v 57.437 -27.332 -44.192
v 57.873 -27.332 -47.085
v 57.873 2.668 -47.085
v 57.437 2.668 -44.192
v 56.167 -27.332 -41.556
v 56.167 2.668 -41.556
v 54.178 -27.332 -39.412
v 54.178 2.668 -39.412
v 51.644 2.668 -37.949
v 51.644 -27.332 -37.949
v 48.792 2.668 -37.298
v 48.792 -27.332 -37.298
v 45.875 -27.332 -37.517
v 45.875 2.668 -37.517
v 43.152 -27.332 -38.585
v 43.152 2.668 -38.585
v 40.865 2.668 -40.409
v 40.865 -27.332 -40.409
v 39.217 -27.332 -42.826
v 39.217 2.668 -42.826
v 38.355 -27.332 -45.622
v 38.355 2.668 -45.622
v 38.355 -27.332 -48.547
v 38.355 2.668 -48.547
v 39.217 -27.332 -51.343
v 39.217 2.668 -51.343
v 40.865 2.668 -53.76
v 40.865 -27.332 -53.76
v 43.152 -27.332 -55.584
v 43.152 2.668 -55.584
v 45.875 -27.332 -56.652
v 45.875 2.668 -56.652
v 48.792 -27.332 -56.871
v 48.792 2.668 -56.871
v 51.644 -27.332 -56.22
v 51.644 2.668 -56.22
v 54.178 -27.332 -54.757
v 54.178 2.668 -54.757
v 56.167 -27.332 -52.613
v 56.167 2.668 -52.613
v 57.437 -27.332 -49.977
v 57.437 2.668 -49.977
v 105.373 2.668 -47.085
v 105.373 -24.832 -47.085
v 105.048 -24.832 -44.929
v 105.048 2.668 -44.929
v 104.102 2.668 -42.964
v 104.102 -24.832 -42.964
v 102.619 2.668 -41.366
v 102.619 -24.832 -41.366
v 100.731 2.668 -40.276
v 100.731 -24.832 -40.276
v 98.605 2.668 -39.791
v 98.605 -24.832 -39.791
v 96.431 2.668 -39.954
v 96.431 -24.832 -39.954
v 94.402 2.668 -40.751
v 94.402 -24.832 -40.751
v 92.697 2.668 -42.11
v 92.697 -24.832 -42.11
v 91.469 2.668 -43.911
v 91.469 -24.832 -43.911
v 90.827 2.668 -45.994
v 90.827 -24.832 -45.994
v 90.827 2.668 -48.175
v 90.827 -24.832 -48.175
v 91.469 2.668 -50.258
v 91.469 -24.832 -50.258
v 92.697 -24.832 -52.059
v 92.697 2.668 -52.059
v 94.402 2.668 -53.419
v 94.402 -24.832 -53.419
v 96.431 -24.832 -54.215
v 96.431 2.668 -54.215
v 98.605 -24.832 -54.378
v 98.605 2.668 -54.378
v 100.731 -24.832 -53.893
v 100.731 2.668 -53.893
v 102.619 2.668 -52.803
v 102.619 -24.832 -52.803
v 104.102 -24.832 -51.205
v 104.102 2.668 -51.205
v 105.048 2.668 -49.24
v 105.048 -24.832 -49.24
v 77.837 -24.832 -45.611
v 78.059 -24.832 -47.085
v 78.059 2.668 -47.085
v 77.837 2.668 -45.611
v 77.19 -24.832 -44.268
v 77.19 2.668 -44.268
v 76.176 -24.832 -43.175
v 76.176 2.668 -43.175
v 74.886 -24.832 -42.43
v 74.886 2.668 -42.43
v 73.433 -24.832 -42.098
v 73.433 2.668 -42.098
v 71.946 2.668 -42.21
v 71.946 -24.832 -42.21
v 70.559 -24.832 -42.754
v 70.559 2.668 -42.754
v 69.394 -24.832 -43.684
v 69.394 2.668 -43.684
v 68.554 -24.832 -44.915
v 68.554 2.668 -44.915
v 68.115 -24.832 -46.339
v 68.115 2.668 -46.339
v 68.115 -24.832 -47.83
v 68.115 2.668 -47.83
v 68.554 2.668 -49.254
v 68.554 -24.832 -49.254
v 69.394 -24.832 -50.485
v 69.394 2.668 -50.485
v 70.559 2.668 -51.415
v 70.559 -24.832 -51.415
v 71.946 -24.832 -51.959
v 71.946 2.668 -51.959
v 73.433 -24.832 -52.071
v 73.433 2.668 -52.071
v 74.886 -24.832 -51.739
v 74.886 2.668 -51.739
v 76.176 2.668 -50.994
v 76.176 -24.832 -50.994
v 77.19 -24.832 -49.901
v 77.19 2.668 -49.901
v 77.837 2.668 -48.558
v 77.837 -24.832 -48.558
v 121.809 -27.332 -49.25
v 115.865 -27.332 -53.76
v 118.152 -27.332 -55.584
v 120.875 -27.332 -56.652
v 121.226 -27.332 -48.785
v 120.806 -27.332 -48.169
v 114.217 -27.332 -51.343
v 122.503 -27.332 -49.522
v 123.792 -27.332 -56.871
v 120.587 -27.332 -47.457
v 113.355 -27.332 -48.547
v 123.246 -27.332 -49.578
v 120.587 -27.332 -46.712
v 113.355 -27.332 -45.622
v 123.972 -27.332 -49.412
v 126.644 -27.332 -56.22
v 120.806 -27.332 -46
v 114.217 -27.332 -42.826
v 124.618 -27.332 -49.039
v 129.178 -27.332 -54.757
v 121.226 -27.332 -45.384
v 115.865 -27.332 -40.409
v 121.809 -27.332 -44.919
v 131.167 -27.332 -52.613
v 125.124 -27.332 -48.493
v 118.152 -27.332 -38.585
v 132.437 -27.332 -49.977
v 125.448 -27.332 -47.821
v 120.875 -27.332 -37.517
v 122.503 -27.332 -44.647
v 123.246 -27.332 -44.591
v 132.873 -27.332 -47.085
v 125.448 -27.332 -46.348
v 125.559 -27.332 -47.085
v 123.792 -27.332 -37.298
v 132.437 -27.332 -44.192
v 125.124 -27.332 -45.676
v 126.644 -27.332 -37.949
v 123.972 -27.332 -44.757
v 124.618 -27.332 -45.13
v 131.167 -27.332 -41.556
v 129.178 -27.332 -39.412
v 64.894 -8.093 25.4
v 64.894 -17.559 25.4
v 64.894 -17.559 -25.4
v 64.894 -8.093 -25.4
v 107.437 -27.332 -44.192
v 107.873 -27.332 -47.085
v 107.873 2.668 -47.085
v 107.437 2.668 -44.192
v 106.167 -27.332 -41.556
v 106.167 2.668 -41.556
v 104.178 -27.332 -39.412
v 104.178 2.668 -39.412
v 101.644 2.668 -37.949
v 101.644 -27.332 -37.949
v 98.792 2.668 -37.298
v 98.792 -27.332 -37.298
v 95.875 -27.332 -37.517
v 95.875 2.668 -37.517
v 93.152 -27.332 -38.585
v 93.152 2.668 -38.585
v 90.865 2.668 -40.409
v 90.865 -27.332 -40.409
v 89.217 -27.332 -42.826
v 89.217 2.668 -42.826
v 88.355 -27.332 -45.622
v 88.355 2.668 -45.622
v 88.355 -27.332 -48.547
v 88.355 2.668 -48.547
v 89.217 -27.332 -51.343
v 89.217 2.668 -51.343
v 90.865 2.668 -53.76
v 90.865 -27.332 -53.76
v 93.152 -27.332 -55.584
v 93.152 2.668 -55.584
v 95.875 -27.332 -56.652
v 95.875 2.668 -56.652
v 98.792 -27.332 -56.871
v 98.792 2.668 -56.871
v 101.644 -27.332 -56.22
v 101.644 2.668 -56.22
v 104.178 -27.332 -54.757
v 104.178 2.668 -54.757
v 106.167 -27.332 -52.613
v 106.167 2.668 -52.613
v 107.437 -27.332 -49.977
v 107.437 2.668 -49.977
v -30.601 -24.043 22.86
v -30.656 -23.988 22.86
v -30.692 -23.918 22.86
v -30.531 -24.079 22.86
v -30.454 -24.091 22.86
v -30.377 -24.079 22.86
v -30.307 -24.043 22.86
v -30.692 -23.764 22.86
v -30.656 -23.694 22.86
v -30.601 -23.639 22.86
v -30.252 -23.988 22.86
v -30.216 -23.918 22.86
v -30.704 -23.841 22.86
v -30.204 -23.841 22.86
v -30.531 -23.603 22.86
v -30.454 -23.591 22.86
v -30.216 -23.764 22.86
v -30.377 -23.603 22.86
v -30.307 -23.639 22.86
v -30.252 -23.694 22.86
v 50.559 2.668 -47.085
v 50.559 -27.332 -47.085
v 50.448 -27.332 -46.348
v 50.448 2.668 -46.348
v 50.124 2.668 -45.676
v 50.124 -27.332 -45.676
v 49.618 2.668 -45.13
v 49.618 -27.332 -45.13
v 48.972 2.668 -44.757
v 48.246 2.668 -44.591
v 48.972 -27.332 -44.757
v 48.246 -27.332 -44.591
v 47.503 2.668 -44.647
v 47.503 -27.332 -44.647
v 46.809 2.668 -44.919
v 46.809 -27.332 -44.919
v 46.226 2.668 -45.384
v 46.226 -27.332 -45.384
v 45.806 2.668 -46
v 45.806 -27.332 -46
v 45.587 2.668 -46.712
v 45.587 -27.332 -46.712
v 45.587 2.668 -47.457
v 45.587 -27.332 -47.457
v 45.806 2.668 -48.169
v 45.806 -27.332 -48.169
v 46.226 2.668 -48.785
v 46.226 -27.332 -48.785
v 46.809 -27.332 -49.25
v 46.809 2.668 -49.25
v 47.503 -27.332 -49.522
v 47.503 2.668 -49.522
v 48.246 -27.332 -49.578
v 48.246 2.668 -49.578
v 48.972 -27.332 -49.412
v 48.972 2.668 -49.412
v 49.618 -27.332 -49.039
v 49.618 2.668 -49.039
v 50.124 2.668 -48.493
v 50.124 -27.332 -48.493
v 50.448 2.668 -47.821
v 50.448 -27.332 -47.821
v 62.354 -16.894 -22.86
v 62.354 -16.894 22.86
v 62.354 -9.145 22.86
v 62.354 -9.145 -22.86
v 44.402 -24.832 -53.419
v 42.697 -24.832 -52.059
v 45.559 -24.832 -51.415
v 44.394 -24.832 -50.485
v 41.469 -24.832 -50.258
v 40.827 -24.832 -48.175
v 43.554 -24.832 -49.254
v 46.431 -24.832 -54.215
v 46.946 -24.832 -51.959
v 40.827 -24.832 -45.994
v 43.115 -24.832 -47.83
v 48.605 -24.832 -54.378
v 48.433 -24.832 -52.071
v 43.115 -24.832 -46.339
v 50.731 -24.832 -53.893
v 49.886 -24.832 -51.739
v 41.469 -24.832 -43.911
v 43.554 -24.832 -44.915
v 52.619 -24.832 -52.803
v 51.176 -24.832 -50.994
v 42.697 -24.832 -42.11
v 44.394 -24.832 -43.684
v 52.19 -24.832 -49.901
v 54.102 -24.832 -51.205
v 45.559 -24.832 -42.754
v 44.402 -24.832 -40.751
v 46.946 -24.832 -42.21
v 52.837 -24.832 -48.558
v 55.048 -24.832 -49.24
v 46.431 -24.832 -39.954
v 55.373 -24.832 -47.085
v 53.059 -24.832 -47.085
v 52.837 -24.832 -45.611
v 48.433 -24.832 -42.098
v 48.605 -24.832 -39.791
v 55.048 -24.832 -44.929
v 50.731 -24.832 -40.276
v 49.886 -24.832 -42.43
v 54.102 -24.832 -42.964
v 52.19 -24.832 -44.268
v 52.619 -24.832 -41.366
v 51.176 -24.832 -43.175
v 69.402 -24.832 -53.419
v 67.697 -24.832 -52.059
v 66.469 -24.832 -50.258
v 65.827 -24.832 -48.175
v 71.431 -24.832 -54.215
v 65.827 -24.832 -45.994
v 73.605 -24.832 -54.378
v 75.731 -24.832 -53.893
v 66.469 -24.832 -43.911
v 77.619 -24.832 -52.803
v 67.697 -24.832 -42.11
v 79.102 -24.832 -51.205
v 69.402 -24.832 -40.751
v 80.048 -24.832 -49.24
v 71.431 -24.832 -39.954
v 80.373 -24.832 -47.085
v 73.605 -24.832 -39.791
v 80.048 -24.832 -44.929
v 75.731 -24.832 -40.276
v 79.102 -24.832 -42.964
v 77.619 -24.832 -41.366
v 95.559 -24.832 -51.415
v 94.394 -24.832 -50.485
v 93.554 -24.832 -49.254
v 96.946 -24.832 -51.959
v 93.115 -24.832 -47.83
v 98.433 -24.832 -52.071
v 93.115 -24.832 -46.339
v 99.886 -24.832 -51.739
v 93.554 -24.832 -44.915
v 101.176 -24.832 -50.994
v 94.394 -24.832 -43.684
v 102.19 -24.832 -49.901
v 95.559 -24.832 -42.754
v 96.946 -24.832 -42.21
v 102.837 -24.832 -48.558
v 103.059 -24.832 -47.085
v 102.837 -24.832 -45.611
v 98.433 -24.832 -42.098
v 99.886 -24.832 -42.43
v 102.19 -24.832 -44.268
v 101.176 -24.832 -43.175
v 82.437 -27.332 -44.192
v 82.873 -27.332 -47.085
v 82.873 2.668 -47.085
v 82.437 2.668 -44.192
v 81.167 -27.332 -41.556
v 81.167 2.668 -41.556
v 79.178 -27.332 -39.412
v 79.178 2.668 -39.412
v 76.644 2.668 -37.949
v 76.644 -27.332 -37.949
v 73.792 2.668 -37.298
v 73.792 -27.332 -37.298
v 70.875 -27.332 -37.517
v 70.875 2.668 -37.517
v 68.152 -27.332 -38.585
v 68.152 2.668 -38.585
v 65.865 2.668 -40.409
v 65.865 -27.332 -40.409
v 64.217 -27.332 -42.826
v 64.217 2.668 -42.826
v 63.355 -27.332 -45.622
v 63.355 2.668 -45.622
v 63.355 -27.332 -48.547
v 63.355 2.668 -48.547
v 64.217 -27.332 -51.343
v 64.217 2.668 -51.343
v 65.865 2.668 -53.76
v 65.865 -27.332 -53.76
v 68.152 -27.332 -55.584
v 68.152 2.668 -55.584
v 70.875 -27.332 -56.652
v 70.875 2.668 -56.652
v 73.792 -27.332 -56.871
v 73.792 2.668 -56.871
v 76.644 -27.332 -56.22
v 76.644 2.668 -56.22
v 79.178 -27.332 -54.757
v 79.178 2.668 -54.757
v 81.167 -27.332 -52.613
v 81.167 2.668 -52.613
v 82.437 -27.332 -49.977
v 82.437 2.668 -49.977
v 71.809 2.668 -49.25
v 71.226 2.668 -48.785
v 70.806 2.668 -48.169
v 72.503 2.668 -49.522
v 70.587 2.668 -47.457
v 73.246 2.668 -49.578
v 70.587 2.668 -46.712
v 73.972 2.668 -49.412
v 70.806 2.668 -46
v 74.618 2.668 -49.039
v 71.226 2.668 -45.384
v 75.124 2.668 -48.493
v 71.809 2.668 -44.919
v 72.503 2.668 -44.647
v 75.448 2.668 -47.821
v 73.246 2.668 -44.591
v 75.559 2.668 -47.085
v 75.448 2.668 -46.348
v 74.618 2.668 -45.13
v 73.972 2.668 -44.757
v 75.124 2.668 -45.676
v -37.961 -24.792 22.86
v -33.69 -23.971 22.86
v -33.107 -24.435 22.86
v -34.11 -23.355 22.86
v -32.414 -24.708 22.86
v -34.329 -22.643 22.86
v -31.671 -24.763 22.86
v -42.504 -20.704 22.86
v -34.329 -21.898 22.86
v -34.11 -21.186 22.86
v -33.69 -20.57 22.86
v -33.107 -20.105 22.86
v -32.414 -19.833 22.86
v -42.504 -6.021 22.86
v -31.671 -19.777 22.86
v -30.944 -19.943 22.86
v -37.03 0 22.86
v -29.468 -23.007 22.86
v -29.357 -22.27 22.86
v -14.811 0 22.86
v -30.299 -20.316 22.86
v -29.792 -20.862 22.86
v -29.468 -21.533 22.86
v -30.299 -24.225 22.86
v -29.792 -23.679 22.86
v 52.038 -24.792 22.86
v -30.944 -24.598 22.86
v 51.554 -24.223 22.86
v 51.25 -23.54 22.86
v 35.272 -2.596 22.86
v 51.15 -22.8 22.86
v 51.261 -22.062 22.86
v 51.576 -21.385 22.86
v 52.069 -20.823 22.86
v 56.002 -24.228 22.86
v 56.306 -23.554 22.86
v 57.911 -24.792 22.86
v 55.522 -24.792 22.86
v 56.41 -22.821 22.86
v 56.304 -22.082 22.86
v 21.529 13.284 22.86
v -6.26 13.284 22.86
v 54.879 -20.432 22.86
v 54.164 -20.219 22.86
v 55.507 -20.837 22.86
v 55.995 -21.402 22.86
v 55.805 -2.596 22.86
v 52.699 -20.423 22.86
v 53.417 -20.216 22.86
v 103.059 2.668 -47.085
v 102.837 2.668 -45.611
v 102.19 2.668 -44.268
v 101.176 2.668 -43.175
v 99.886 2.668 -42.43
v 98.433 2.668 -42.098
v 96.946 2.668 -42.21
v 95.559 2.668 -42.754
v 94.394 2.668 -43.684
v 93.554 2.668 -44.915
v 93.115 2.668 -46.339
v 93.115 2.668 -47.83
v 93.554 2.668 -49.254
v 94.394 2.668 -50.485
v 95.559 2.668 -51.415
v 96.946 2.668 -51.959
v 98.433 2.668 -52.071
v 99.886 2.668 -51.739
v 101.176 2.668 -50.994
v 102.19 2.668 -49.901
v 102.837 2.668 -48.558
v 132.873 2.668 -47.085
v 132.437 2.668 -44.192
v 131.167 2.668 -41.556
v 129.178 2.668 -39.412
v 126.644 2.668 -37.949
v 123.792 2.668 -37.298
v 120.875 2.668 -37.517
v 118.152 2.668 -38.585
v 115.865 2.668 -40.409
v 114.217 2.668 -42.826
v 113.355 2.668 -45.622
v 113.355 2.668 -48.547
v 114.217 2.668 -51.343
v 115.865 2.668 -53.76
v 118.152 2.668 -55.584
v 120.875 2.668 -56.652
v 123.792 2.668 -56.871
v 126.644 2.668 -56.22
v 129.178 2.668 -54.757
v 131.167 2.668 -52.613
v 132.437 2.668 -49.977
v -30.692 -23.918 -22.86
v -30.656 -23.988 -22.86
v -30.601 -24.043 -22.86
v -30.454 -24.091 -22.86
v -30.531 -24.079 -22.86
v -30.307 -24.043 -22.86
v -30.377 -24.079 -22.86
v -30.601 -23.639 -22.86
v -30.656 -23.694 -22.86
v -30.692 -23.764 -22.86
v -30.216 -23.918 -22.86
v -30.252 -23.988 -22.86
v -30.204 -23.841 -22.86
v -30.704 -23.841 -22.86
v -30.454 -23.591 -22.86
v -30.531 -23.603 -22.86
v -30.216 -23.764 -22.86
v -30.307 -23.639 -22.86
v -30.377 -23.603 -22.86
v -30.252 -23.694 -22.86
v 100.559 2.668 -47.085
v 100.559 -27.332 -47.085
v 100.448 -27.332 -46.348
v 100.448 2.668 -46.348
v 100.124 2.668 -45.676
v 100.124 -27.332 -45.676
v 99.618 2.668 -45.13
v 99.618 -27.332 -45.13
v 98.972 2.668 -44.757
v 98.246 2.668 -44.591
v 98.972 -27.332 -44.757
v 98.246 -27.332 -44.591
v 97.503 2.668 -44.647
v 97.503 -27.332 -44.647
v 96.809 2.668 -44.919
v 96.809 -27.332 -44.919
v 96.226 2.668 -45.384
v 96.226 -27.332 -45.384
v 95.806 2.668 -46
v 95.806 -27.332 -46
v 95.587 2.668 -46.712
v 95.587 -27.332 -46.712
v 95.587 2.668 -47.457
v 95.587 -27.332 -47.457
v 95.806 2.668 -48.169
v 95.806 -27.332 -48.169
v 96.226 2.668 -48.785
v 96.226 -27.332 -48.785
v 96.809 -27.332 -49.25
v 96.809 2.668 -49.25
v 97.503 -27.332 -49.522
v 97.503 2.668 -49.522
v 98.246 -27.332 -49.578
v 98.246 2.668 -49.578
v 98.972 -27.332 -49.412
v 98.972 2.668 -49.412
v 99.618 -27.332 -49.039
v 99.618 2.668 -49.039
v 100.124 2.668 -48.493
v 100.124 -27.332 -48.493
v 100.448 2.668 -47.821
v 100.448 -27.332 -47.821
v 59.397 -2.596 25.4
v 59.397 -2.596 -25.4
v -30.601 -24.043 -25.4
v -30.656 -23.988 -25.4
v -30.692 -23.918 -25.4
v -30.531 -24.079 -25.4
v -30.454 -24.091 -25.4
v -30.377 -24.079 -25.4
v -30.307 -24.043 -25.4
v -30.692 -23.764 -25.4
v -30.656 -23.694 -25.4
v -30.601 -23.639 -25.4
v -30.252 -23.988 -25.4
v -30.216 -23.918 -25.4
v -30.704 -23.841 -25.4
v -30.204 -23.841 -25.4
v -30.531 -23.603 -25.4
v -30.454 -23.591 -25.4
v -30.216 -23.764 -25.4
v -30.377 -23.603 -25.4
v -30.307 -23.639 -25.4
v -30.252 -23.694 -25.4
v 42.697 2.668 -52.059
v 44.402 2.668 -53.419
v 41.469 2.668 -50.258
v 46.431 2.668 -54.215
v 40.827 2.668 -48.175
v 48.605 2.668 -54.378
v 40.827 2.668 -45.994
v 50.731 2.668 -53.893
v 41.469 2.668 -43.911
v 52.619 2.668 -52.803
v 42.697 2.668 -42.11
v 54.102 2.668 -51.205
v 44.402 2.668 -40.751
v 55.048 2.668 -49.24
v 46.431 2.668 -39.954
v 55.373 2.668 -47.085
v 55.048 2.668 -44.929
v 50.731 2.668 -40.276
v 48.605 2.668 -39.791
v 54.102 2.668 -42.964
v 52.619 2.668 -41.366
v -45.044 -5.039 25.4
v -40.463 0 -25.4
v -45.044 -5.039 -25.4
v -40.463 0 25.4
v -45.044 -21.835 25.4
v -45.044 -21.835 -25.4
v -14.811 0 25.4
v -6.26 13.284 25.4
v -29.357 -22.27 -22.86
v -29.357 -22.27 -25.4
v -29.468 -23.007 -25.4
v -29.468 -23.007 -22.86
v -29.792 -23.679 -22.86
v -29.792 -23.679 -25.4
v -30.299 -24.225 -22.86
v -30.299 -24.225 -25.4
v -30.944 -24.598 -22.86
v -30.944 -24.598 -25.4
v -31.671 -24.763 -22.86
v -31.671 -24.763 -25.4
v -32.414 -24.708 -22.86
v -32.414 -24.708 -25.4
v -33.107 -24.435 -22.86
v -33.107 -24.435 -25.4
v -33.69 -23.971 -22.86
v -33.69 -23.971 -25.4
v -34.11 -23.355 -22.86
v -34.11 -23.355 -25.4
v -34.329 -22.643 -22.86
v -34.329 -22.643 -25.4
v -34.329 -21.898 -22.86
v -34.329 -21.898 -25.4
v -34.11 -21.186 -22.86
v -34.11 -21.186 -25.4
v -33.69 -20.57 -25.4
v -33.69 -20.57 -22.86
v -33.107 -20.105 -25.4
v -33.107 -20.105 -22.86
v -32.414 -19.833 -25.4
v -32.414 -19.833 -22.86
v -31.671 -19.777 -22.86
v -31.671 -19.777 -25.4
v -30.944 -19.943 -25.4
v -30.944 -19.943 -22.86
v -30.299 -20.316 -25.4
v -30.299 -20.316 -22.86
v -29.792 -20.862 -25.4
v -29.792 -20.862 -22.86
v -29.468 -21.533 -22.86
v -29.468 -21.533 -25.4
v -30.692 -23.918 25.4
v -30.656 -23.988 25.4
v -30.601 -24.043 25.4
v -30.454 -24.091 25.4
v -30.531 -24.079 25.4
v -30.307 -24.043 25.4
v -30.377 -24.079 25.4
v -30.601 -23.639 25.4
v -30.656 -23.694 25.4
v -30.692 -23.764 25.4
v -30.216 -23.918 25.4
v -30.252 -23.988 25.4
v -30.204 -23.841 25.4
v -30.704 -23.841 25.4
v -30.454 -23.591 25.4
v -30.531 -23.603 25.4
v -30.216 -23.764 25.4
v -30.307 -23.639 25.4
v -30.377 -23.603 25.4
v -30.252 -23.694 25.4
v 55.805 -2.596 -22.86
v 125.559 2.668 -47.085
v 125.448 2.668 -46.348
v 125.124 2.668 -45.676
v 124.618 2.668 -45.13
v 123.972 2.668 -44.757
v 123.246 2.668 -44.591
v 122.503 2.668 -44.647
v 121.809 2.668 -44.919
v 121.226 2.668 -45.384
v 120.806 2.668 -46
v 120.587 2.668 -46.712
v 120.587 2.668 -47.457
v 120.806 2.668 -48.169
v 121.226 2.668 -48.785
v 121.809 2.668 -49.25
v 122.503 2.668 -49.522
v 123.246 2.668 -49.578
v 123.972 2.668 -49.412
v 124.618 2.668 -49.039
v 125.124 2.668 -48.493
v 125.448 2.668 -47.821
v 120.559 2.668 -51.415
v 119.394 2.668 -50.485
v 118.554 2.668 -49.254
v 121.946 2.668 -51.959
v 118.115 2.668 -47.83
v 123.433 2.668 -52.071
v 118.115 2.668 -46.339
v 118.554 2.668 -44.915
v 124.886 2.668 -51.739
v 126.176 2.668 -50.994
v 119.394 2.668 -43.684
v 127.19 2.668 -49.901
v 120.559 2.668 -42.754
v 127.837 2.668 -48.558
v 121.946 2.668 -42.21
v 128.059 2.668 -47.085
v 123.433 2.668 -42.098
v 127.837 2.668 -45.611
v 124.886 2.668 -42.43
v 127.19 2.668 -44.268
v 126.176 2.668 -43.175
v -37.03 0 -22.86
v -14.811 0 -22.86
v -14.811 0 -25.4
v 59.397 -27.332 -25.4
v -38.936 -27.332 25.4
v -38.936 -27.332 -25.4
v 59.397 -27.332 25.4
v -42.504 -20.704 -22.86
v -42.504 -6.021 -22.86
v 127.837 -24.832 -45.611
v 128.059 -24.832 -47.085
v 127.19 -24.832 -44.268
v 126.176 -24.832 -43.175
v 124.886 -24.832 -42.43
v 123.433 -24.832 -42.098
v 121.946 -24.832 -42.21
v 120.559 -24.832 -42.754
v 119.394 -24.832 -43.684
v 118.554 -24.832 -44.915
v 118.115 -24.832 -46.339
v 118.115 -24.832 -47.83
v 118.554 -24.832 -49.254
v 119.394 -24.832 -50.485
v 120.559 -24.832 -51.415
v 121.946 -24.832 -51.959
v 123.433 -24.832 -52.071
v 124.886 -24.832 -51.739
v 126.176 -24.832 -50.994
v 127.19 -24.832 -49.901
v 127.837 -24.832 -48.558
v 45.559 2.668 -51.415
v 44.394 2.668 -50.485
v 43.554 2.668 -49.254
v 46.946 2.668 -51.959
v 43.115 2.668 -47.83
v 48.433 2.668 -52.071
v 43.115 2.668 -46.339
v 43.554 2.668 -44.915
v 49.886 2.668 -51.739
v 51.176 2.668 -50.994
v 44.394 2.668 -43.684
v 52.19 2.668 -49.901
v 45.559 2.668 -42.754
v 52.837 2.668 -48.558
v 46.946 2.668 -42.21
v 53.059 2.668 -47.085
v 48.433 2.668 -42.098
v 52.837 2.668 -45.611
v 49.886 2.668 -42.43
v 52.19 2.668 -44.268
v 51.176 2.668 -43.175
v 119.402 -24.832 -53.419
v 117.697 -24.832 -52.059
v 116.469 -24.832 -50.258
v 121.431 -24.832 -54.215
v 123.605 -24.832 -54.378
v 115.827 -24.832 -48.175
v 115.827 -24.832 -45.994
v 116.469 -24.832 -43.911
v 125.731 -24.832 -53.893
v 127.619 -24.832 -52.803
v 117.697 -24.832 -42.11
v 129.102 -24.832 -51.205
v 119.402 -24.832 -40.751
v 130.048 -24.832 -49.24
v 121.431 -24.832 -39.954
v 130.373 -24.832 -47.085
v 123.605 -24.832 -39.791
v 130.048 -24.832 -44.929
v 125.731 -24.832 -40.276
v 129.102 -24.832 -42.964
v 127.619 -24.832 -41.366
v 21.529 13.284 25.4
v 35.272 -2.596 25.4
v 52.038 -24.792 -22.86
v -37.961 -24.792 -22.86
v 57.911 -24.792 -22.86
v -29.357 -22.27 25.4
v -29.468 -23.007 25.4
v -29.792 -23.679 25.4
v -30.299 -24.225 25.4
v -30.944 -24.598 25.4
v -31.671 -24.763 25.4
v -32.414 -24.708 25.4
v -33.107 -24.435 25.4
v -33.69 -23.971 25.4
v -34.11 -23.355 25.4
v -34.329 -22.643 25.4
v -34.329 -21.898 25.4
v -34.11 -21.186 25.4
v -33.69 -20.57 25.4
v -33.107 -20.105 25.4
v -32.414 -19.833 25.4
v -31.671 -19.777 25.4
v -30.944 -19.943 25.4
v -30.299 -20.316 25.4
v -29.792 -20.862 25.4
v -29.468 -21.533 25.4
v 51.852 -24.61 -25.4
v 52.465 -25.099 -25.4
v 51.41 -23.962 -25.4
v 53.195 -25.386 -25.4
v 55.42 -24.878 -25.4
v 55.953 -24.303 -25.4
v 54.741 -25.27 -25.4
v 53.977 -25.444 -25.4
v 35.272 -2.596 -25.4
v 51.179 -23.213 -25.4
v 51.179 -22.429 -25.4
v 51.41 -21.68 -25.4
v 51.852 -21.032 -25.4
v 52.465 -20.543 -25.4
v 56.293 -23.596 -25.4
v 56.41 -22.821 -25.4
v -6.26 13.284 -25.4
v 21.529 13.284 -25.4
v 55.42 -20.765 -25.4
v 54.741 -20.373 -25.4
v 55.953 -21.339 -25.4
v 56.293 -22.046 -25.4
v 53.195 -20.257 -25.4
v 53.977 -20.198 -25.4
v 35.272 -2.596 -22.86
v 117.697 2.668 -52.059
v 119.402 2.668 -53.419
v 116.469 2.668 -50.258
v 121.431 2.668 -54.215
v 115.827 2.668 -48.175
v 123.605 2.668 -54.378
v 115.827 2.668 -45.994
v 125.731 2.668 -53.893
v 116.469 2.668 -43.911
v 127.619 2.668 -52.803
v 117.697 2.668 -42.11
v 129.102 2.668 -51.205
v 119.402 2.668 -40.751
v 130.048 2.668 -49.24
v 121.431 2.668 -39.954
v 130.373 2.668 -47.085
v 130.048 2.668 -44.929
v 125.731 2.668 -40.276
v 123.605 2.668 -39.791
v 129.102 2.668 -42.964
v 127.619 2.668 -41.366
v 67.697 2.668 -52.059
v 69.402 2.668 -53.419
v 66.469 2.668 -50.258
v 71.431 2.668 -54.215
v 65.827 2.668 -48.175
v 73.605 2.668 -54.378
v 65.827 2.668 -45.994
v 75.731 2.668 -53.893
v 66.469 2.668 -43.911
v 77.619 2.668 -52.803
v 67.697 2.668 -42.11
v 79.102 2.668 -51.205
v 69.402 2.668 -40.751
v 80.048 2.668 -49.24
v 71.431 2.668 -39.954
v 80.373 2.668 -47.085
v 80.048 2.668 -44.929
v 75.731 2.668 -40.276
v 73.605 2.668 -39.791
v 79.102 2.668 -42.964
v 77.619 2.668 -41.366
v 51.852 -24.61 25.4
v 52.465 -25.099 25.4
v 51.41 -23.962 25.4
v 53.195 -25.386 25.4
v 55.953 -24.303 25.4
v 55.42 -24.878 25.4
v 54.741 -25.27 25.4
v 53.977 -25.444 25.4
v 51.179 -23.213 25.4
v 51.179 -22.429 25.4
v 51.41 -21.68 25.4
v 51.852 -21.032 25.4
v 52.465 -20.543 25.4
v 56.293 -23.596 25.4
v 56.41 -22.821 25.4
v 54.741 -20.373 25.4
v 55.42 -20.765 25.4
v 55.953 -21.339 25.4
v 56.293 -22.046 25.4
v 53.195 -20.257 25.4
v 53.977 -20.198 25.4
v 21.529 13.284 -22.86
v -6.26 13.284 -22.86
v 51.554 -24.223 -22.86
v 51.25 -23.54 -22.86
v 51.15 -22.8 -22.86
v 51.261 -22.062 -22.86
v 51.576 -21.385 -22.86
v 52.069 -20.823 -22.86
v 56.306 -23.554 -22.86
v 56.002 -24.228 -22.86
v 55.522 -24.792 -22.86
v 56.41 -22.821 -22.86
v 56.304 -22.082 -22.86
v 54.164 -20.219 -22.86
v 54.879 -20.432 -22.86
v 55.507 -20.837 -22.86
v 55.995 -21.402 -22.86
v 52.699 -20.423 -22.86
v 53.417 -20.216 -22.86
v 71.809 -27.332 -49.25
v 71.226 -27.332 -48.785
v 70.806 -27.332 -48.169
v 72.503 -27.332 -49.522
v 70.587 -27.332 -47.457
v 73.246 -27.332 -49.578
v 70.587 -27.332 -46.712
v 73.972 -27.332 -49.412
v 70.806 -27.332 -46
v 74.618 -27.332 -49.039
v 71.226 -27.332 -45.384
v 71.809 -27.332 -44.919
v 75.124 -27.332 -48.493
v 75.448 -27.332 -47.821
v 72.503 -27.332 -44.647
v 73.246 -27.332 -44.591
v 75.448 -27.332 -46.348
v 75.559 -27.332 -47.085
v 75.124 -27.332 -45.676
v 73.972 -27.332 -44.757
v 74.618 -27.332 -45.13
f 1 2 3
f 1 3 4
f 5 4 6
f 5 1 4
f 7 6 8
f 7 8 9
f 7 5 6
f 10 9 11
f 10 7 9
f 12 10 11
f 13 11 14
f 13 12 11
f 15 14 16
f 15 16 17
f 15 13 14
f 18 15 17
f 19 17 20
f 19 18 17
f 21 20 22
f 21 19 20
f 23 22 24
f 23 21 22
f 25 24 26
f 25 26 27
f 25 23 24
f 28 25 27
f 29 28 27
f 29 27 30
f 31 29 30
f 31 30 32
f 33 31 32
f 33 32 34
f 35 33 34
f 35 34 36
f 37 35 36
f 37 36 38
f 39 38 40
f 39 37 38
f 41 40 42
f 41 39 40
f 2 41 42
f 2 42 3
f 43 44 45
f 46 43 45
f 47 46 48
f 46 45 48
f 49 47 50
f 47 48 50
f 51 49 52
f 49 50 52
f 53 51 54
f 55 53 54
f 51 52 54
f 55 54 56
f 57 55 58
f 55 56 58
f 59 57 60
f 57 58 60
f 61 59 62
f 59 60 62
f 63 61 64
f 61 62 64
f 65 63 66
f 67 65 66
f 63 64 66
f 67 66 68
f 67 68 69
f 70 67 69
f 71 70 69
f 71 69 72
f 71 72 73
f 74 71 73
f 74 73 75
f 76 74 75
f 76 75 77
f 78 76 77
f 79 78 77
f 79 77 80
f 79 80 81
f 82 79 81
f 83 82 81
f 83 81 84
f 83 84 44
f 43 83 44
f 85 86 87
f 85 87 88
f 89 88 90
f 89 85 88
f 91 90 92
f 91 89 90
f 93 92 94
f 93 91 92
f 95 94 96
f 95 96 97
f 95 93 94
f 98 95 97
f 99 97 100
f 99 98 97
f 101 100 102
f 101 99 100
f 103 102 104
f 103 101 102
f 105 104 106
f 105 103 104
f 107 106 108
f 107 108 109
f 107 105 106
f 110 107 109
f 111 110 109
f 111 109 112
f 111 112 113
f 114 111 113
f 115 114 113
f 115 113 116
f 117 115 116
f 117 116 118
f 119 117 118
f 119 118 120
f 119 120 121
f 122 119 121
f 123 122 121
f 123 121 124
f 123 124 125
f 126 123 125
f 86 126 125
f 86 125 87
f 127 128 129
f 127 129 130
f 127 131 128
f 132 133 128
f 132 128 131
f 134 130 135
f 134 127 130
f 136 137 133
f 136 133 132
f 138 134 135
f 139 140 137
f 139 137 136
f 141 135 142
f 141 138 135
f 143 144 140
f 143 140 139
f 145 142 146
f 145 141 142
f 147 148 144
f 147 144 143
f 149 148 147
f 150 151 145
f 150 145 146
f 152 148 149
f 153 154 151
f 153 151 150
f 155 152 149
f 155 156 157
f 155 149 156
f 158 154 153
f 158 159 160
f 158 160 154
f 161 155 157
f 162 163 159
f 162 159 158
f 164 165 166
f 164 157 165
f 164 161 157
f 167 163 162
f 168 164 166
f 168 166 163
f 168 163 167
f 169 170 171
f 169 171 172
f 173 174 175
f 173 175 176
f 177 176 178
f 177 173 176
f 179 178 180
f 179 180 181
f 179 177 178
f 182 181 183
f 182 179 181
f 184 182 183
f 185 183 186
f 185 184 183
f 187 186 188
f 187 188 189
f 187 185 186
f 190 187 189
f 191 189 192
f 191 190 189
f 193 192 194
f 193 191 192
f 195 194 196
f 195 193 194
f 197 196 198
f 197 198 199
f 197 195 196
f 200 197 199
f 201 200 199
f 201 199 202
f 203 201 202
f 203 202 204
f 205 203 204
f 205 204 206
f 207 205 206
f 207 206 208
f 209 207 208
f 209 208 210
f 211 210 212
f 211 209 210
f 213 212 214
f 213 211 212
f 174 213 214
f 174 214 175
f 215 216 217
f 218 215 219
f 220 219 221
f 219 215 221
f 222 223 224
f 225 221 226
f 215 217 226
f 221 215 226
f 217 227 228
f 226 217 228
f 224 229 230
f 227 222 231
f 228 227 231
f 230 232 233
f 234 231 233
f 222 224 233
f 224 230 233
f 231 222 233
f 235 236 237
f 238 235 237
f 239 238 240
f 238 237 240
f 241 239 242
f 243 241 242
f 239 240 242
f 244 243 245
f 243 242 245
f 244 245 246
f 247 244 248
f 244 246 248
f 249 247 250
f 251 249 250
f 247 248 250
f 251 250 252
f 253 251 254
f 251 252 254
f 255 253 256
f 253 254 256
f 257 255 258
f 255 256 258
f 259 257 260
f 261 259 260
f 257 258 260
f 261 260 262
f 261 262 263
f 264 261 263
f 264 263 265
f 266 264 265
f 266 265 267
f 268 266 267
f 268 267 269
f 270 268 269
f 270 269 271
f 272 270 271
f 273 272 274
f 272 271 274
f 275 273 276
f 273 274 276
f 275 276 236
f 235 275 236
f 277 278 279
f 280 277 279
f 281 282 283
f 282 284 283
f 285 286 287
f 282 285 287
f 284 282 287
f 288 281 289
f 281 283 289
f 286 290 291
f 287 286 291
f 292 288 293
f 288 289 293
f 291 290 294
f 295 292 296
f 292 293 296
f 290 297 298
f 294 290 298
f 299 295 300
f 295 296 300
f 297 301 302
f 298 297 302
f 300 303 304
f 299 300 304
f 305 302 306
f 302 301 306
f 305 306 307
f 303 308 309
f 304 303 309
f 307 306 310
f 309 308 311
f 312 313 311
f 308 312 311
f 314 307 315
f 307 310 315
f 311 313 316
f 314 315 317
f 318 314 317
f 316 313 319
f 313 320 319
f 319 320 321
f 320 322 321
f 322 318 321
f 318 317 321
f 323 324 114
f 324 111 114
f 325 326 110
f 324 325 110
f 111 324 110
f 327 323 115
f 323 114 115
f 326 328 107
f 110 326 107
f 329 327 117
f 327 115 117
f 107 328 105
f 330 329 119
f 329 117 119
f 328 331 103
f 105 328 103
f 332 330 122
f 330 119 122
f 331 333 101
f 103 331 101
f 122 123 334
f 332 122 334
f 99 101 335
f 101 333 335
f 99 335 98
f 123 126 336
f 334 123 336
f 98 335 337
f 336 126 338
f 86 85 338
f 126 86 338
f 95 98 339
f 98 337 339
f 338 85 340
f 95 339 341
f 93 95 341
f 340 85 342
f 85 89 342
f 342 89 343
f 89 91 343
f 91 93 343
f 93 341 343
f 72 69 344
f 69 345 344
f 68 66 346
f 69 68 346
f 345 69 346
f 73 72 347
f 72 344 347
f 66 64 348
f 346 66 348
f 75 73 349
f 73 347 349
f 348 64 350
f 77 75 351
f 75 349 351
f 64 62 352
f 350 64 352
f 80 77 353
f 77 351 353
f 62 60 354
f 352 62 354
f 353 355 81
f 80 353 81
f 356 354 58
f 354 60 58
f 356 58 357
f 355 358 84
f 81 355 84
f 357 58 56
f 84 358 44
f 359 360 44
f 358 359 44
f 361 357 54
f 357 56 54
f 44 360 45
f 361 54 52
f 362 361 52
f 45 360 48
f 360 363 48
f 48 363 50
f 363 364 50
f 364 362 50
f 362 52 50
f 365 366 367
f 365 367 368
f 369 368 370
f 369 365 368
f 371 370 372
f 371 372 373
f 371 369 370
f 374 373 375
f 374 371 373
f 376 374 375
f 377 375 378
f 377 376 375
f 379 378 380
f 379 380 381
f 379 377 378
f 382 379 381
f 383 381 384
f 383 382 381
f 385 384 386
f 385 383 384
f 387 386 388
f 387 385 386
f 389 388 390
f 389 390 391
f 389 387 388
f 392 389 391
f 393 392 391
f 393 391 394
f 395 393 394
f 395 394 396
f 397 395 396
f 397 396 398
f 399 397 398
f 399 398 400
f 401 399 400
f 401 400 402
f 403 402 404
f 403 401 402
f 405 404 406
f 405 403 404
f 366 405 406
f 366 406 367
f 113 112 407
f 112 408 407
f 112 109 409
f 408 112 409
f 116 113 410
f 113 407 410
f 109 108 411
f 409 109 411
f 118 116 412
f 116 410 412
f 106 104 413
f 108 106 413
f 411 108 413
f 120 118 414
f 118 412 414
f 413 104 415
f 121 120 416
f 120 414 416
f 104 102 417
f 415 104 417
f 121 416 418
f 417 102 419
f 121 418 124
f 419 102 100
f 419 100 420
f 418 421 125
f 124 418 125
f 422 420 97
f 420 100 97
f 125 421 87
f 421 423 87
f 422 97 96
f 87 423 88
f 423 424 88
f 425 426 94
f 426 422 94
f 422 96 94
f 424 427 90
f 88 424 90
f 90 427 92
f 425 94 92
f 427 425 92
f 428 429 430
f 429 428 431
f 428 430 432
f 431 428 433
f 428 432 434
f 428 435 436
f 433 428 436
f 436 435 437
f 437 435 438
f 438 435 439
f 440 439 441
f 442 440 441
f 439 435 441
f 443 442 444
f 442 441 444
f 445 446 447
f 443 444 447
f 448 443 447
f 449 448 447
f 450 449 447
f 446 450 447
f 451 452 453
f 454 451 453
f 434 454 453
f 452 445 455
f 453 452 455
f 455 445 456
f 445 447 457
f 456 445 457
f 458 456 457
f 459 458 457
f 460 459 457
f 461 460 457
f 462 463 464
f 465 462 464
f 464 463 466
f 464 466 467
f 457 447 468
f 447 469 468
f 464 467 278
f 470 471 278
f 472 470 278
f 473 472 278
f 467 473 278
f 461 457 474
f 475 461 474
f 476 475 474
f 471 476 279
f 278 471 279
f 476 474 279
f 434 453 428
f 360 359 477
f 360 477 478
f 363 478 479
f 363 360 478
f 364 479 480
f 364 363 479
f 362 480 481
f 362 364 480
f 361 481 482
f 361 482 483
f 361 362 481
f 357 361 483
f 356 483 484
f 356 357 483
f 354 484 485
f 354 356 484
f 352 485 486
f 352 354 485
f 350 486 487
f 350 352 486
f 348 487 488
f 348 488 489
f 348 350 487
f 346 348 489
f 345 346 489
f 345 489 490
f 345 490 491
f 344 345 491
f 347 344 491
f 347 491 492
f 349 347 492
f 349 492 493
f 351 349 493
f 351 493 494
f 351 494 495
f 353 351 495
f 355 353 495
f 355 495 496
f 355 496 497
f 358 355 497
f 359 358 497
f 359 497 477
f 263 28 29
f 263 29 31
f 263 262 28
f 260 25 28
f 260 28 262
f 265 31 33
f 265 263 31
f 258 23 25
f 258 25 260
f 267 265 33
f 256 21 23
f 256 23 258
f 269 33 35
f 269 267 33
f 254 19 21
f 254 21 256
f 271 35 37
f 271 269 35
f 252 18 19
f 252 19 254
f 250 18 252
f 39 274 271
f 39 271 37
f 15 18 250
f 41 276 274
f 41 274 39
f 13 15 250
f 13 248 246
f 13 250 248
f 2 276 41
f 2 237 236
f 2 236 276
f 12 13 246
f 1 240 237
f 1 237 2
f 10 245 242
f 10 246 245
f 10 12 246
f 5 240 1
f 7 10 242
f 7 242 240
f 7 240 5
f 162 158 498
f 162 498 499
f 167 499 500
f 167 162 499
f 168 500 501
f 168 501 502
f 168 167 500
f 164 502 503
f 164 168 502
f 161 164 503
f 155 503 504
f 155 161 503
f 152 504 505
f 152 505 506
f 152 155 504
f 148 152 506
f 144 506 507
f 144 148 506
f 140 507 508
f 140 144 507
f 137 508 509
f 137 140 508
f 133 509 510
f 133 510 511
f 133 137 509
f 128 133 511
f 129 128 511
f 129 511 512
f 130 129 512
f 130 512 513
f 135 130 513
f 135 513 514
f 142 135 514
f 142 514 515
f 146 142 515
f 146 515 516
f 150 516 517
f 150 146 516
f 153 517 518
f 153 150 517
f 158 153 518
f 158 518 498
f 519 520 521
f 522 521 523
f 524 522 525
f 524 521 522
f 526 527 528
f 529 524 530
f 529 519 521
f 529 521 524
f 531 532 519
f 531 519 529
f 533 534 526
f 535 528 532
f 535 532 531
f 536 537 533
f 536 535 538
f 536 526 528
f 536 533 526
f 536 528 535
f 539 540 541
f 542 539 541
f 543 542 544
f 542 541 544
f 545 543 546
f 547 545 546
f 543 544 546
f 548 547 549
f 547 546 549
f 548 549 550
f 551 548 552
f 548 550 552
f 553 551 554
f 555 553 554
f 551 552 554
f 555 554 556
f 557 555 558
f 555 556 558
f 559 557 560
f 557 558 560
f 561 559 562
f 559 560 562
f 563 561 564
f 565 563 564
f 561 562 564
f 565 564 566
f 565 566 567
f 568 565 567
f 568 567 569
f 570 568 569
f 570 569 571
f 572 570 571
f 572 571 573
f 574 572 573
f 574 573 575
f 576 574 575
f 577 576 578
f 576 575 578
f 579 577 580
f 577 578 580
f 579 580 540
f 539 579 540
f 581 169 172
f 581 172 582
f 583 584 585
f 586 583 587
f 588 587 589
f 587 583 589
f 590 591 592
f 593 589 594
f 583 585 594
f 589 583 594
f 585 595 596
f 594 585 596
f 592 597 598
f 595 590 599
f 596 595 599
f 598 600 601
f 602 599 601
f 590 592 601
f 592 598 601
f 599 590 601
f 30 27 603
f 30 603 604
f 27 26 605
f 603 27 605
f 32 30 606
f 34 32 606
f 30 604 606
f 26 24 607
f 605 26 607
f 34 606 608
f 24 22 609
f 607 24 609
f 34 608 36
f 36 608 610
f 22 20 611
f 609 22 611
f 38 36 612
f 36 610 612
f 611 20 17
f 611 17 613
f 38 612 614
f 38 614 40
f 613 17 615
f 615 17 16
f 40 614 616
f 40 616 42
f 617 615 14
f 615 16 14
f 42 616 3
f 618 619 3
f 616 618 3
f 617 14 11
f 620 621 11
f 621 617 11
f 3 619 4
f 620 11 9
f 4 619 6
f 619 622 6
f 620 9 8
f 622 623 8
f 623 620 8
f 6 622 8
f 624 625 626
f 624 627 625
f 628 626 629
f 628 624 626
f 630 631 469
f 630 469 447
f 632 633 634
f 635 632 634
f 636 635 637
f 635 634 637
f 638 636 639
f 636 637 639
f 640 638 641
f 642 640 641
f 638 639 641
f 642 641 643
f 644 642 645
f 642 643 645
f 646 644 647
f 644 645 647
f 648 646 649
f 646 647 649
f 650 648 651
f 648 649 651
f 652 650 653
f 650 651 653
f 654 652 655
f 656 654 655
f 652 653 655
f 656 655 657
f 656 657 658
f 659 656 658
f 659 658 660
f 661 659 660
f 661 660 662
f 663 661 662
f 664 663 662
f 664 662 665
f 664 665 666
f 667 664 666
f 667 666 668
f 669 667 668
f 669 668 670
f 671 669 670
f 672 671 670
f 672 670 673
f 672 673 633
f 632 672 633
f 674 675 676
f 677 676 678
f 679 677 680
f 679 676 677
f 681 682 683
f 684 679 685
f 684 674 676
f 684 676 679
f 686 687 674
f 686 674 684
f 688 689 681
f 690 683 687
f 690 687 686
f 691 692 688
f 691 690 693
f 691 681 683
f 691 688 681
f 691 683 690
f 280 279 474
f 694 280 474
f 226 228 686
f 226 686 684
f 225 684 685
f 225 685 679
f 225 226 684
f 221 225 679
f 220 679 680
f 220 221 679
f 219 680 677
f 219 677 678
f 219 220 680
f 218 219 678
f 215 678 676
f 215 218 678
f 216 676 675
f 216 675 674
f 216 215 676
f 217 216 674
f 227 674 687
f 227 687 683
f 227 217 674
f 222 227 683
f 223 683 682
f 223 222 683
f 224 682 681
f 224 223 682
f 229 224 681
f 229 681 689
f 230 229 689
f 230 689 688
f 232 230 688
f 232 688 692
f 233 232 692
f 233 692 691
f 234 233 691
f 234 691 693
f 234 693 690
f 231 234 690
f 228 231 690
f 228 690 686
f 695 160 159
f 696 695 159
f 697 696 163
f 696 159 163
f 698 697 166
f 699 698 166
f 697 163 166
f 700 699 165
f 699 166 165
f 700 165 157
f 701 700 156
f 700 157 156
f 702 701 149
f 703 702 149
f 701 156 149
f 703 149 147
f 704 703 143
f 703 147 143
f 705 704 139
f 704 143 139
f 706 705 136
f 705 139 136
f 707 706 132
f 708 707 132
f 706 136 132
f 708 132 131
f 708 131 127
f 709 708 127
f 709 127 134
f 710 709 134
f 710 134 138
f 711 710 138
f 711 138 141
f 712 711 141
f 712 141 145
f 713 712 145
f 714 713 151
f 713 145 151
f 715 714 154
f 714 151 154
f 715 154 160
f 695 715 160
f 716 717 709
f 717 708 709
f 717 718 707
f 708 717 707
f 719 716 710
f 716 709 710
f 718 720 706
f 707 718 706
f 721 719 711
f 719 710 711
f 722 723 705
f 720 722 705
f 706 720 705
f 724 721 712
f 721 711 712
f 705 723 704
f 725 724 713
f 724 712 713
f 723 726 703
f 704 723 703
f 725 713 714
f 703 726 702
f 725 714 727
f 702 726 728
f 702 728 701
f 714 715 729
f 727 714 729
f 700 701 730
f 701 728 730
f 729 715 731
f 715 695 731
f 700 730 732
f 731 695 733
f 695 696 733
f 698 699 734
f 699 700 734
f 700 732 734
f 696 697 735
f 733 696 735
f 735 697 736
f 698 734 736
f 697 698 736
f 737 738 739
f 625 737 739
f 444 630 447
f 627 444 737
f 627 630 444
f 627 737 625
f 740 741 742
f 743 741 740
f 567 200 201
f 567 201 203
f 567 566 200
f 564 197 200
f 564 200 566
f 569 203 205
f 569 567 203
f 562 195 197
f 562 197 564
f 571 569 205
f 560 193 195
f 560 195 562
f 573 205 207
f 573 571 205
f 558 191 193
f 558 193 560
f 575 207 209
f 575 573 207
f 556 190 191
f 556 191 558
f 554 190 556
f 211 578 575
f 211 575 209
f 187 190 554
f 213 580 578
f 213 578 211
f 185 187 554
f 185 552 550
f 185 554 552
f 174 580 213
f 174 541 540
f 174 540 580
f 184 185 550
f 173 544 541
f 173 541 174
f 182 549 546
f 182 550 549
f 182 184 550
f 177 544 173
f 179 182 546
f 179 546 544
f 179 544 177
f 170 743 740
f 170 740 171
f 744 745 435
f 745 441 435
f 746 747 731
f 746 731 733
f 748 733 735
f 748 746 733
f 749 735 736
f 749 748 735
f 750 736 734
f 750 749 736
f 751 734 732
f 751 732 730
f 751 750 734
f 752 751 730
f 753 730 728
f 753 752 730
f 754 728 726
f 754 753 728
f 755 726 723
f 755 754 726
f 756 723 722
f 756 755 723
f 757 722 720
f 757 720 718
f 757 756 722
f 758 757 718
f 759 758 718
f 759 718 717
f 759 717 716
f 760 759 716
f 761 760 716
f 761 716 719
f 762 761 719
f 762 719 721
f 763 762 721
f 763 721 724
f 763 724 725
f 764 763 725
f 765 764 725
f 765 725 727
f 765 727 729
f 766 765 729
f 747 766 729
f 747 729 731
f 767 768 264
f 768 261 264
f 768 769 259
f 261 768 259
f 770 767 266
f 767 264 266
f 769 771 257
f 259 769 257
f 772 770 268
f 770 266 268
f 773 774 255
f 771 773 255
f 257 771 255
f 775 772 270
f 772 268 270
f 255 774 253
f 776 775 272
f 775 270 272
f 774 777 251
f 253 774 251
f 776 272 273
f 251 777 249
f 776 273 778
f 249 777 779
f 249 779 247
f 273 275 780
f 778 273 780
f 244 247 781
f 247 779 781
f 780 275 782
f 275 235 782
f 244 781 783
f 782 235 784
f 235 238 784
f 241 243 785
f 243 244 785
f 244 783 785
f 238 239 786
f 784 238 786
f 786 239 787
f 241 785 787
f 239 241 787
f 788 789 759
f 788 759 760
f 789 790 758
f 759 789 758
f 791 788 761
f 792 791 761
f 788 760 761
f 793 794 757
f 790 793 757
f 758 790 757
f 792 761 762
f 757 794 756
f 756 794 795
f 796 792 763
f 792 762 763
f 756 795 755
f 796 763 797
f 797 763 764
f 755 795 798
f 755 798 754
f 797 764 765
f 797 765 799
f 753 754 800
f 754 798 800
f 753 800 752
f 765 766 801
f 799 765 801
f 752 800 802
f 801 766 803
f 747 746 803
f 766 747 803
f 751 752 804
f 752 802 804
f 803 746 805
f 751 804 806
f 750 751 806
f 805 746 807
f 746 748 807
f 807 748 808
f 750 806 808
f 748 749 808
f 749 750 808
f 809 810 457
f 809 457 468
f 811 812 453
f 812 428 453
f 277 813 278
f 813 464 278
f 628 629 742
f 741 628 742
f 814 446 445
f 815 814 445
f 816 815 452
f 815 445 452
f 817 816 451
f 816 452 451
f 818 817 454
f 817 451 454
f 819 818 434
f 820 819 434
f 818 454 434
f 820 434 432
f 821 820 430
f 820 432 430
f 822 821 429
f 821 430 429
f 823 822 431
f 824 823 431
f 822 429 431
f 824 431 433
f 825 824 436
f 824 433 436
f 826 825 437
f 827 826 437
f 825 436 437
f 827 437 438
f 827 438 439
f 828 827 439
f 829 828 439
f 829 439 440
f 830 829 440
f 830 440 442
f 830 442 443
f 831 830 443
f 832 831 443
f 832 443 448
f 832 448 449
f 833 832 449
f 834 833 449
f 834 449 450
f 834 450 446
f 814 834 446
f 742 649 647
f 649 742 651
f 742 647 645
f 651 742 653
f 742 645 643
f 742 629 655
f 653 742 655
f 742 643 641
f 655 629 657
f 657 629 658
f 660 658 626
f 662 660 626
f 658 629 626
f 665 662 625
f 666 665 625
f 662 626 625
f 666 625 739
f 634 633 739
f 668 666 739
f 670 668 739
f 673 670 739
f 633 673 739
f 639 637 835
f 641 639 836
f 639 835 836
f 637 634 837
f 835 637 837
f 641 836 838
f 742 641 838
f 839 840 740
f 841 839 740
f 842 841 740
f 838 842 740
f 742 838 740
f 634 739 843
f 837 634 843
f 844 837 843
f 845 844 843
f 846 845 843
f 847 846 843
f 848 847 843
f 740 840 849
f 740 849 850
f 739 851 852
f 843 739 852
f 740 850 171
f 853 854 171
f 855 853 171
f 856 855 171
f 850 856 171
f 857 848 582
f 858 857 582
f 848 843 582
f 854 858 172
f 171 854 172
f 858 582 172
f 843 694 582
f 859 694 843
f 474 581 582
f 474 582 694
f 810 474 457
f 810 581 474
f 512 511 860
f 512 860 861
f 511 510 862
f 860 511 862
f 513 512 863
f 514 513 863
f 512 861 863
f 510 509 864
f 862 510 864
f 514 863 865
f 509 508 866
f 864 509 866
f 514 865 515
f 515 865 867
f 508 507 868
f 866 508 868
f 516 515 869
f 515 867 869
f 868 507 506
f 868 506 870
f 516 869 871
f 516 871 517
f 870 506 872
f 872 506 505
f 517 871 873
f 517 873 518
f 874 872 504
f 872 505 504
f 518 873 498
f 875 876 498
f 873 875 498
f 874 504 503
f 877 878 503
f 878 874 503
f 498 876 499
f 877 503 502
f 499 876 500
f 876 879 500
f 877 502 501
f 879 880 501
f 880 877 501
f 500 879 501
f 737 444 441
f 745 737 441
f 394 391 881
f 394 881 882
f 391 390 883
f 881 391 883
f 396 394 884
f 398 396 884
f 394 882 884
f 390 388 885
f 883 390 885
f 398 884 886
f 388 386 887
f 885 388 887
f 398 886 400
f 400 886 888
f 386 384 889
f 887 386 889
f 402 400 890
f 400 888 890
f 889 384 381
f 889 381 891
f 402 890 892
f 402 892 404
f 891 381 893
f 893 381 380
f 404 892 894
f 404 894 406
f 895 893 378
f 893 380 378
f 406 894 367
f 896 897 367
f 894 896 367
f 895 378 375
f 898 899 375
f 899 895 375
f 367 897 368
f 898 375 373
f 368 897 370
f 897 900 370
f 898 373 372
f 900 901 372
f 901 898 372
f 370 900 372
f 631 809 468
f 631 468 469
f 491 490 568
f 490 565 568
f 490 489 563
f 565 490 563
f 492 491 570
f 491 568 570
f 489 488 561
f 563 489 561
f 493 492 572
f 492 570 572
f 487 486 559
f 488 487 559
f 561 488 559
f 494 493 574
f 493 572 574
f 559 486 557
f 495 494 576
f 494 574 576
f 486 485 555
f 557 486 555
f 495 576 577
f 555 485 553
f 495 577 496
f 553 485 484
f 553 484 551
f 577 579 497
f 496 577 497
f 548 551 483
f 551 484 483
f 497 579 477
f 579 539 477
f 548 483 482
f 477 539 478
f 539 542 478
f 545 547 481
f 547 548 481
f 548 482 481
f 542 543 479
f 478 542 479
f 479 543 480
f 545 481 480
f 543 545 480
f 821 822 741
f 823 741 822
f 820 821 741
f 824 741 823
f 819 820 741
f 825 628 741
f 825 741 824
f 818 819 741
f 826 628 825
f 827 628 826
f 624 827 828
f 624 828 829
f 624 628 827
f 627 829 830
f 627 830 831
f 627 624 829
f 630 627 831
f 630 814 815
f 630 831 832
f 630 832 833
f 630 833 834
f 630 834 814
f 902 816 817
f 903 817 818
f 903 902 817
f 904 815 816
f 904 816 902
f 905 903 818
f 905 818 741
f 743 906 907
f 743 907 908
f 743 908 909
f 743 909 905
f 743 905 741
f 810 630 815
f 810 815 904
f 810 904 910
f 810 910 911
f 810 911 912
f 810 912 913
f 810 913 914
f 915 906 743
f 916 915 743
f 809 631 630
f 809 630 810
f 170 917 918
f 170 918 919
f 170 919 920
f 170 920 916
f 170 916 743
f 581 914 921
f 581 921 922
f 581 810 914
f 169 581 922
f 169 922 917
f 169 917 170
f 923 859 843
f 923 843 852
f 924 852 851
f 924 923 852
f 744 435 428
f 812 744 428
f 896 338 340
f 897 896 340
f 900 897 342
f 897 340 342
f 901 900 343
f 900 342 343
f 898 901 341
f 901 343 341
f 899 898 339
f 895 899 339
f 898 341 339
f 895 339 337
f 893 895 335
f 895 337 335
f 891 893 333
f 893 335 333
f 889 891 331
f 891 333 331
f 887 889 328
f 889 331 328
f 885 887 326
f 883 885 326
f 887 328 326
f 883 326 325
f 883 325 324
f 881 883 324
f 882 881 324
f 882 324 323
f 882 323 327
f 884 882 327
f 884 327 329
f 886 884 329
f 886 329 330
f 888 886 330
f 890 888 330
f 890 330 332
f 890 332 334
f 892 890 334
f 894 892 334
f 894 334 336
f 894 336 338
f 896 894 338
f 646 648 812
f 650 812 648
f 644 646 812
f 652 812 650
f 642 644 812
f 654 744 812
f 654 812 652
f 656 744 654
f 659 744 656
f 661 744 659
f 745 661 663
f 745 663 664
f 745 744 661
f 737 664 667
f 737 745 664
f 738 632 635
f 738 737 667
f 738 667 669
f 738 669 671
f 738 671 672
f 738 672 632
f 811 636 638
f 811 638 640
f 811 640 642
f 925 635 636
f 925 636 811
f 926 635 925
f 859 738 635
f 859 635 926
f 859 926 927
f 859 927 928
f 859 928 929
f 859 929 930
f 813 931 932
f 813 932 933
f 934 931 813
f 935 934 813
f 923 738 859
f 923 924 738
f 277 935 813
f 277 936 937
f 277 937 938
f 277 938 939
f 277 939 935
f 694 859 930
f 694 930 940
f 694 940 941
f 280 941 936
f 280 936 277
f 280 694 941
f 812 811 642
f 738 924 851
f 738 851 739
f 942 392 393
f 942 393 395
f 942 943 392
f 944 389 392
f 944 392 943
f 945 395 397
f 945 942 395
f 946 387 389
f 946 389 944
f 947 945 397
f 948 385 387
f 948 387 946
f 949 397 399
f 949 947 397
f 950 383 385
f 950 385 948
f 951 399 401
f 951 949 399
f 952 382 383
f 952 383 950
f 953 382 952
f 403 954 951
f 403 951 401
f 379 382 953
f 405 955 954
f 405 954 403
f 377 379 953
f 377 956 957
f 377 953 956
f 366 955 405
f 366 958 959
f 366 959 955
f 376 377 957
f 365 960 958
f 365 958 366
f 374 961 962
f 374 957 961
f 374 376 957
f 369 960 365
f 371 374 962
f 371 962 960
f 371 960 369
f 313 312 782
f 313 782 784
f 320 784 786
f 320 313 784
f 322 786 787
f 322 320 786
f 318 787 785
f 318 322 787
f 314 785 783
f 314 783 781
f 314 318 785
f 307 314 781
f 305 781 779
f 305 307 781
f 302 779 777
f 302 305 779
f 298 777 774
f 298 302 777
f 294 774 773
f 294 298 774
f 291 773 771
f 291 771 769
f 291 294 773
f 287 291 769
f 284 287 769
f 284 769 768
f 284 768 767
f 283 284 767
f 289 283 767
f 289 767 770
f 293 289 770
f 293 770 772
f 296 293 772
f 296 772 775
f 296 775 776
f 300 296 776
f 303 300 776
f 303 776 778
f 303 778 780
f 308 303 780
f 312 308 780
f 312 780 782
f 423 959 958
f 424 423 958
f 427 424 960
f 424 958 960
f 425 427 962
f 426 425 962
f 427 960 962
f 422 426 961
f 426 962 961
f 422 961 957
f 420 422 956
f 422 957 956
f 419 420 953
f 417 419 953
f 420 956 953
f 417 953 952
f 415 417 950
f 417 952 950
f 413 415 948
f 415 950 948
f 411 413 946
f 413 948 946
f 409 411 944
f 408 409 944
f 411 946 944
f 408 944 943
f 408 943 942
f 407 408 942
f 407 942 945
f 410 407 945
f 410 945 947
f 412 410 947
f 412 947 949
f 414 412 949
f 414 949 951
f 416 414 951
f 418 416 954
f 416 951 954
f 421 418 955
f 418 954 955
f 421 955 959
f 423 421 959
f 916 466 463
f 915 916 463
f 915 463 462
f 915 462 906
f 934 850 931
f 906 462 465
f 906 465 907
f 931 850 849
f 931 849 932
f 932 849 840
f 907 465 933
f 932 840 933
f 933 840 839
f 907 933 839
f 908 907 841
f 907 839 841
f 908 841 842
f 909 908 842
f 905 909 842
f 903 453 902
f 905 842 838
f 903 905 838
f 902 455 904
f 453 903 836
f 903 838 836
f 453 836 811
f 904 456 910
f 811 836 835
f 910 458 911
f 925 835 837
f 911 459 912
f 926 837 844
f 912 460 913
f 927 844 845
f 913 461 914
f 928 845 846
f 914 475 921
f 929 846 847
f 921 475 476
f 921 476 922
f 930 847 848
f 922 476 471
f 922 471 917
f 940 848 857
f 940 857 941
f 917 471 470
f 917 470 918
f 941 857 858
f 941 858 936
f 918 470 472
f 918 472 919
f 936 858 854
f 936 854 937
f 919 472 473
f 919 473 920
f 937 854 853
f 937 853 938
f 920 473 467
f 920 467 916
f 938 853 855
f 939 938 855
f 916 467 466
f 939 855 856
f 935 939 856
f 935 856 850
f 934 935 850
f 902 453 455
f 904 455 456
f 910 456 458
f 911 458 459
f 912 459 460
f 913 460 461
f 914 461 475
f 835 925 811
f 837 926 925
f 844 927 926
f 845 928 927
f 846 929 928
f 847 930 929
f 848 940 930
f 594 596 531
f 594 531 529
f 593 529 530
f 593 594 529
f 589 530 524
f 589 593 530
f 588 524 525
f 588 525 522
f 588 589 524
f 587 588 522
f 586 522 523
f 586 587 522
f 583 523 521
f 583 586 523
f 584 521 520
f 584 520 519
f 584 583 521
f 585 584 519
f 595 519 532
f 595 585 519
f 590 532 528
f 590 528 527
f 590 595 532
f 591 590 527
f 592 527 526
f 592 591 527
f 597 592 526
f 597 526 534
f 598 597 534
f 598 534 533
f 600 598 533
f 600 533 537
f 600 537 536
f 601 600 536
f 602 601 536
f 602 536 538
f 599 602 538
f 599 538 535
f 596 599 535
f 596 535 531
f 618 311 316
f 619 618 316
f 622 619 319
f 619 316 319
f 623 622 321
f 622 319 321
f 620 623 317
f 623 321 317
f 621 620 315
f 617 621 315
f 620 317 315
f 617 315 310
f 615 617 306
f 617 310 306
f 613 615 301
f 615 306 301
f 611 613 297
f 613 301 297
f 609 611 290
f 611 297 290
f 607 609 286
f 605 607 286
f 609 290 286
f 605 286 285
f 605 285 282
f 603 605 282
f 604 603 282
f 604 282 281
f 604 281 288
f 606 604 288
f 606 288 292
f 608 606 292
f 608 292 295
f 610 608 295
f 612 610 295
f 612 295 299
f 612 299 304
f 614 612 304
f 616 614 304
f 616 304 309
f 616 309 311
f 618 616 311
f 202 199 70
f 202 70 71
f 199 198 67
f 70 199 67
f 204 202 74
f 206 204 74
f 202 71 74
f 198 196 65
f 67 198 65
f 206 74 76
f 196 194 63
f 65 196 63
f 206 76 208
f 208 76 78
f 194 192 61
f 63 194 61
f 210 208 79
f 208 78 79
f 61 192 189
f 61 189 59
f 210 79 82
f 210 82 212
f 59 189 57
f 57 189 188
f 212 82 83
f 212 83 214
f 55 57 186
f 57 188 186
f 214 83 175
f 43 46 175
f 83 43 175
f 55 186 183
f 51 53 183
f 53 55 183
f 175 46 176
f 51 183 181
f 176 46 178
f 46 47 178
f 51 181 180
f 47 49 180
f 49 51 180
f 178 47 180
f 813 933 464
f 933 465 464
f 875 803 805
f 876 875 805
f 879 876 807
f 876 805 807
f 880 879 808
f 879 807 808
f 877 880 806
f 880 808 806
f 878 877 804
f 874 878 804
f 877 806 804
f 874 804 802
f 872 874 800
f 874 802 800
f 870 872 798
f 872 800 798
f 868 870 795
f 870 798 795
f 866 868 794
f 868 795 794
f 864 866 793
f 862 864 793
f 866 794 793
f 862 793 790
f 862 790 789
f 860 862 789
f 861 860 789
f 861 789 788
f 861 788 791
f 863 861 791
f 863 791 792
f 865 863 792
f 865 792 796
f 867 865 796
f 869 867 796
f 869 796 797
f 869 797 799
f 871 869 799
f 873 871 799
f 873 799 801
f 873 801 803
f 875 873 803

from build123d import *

# Parameters (mm, degrees)
F1_DEPTH = 25.4
F2_T     = -2.54
F3_R     = 2.630381548
F3_R_2   = 2.5
F3_R_3   = 0.25
F4_DEPTH = 80
F5_R     = 9.8138712701
F5_R_2   = 2.5
F6_DEPTH = 30
F7_T     = -2.5
F7_2_T   = -2.5
F7_3_T   = -2.5
F7_4_T   = -2.5


with BuildPart() as f1:
    # F0 (on Top) → F1 (new body, symmetric)
    with BuildSketch(Plane.XY):
        Polygon((-45.0437963009, -21.8347907066), (-38.9361642301, -27.3316595703), (59.3967363238, -27.3316595703), (64.8936107755, -17.5594463944), (64.8936107755, -8.0926148221), (59.3967363238, -2.5957443286), (35.2715887129, -2.5957443286), (21.5294081718, 13.2841039449), (-6.2603242695, 13.2841039449), (-14.8110119626, 0), (-40.4630713165, 0), (-45.0437963009, -5.0387978554), (-45.0437963009, -14.5056294277), align=None)
    extrude(amount=F1_DEPTH, both=True)

    # F2
    f2_openings = [f1.faces().sort_by_distance(p)[0] for p in [
        (7.634542, 13.284104, 0),
        (-10.535668, 6.642052, 0),
        (-27.637042, 0, 0),
        (28.400498, 5.34418, 0),
        (47.334163, -2.595744, 0),
    ]]
    offset(amount=F2_T, openings=f2_openings)

    # F3 (on face) → F4 (cut)
    with BuildSketch(Plane(origin=(0, 0, -25.4), x_dir=(1, 0, 0), z_dir=(0, 0, -1))):
        with Locations((53.7799447775, 22.8211097419)):
            Circle(F3_R)
        with Locations((-31.8573266268, 22.2703870386)):
            Circle(F3_R_2)
        with Locations((-30.4541640157, 23.8408566253)):
            Circle(F3_R_3, mode=Mode.SUBTRACT)
    extrude(amount=-F4_DEPTH, mode=Mode.SUBTRACT)


with BuildPart() as f6:
    # F5 (on face) → F6 (new body)
    with BuildSketch(Plane.XZ.offset(27.3316595703)):
        with Locations((123.0588823557, -47.0845066011)):
            Circle(F5_R)
        with Locations((123.0588823557, -47.0845066011)):
            Circle(F5_R_2, mode=Mode.SUBTRACT)
    extrude(amount=-F6_DEPTH)

    # F7
    f7_openings = [f6.faces().sort_by_distance(p)[0] for p in [
        (113.522589, 2.66834, -47.084507),
    ]]
    offset(amount=F7_T, openings=f7_openings)


with BuildPart() as f6b:
    # F5 (on face) → F6, piece 2 (new body)
    with BuildSketch(Plane.XZ.offset(27.3316595703)):
        with Locations((98.0588823557, -47.0845066011)):
            Circle(F5_R)
        with Locations((98.0588823557, -47.0845066011)):
            Circle(F5_R_2, mode=Mode.SUBTRACT)
    extrude(amount=-F6_DEPTH)

    # F7#2
    f7_2_openings = [f6b.faces().sort_by_distance(p)[0] for p in [
        (88.522589, 2.66834, -47.084507),
    ]]
    offset(amount=F7_2_T, openings=f7_2_openings)


with BuildPart() as f6c:
    # F5 (on face) → F6, piece 3 (new body)
    with BuildSketch(Plane.XZ.offset(27.3316595703)):
        with Locations((73.0588823557, -47.0845066011)):
            Circle(F5_R)
        with Locations((73.0588823557, -47.0845066011)):
            Circle(F5_R_2, mode=Mode.SUBTRACT)
    extrude(amount=-F6_DEPTH)

    # F7#3
    f7_3_openings = [f6c.faces().sort_by_distance(p)[0] for p in [
        (63.522589, 2.66834, -47.084507),
    ]]
    offset(amount=F7_3_T, openings=f7_3_openings)


with BuildPart() as f6d:
    # F5 (on face) → F6, piece 4 (new body)
    with BuildSketch(Plane.XZ.offset(27.3316595703)):
        with Locations((48.0588823557, -47.0845066011)):
            Circle(F5_R)
        with Locations((48.0588823557, -47.0845066011)):
            Circle(F5_R_2, mode=Mode.SUBTRACT)
    extrude(amount=-F6_DEPTH)

    # F7#4
    f7_4_openings = [f6d.faces().sort_by_distance(p)[0] for p in [
        (38.522589, 2.66834, -47.084507),
    ]]
    offset(amount=F7_4_T, openings=f7_4_openings)


solid = Compound([f1.part, f6.part, f6b.part, f6c.part, f6d.part])
